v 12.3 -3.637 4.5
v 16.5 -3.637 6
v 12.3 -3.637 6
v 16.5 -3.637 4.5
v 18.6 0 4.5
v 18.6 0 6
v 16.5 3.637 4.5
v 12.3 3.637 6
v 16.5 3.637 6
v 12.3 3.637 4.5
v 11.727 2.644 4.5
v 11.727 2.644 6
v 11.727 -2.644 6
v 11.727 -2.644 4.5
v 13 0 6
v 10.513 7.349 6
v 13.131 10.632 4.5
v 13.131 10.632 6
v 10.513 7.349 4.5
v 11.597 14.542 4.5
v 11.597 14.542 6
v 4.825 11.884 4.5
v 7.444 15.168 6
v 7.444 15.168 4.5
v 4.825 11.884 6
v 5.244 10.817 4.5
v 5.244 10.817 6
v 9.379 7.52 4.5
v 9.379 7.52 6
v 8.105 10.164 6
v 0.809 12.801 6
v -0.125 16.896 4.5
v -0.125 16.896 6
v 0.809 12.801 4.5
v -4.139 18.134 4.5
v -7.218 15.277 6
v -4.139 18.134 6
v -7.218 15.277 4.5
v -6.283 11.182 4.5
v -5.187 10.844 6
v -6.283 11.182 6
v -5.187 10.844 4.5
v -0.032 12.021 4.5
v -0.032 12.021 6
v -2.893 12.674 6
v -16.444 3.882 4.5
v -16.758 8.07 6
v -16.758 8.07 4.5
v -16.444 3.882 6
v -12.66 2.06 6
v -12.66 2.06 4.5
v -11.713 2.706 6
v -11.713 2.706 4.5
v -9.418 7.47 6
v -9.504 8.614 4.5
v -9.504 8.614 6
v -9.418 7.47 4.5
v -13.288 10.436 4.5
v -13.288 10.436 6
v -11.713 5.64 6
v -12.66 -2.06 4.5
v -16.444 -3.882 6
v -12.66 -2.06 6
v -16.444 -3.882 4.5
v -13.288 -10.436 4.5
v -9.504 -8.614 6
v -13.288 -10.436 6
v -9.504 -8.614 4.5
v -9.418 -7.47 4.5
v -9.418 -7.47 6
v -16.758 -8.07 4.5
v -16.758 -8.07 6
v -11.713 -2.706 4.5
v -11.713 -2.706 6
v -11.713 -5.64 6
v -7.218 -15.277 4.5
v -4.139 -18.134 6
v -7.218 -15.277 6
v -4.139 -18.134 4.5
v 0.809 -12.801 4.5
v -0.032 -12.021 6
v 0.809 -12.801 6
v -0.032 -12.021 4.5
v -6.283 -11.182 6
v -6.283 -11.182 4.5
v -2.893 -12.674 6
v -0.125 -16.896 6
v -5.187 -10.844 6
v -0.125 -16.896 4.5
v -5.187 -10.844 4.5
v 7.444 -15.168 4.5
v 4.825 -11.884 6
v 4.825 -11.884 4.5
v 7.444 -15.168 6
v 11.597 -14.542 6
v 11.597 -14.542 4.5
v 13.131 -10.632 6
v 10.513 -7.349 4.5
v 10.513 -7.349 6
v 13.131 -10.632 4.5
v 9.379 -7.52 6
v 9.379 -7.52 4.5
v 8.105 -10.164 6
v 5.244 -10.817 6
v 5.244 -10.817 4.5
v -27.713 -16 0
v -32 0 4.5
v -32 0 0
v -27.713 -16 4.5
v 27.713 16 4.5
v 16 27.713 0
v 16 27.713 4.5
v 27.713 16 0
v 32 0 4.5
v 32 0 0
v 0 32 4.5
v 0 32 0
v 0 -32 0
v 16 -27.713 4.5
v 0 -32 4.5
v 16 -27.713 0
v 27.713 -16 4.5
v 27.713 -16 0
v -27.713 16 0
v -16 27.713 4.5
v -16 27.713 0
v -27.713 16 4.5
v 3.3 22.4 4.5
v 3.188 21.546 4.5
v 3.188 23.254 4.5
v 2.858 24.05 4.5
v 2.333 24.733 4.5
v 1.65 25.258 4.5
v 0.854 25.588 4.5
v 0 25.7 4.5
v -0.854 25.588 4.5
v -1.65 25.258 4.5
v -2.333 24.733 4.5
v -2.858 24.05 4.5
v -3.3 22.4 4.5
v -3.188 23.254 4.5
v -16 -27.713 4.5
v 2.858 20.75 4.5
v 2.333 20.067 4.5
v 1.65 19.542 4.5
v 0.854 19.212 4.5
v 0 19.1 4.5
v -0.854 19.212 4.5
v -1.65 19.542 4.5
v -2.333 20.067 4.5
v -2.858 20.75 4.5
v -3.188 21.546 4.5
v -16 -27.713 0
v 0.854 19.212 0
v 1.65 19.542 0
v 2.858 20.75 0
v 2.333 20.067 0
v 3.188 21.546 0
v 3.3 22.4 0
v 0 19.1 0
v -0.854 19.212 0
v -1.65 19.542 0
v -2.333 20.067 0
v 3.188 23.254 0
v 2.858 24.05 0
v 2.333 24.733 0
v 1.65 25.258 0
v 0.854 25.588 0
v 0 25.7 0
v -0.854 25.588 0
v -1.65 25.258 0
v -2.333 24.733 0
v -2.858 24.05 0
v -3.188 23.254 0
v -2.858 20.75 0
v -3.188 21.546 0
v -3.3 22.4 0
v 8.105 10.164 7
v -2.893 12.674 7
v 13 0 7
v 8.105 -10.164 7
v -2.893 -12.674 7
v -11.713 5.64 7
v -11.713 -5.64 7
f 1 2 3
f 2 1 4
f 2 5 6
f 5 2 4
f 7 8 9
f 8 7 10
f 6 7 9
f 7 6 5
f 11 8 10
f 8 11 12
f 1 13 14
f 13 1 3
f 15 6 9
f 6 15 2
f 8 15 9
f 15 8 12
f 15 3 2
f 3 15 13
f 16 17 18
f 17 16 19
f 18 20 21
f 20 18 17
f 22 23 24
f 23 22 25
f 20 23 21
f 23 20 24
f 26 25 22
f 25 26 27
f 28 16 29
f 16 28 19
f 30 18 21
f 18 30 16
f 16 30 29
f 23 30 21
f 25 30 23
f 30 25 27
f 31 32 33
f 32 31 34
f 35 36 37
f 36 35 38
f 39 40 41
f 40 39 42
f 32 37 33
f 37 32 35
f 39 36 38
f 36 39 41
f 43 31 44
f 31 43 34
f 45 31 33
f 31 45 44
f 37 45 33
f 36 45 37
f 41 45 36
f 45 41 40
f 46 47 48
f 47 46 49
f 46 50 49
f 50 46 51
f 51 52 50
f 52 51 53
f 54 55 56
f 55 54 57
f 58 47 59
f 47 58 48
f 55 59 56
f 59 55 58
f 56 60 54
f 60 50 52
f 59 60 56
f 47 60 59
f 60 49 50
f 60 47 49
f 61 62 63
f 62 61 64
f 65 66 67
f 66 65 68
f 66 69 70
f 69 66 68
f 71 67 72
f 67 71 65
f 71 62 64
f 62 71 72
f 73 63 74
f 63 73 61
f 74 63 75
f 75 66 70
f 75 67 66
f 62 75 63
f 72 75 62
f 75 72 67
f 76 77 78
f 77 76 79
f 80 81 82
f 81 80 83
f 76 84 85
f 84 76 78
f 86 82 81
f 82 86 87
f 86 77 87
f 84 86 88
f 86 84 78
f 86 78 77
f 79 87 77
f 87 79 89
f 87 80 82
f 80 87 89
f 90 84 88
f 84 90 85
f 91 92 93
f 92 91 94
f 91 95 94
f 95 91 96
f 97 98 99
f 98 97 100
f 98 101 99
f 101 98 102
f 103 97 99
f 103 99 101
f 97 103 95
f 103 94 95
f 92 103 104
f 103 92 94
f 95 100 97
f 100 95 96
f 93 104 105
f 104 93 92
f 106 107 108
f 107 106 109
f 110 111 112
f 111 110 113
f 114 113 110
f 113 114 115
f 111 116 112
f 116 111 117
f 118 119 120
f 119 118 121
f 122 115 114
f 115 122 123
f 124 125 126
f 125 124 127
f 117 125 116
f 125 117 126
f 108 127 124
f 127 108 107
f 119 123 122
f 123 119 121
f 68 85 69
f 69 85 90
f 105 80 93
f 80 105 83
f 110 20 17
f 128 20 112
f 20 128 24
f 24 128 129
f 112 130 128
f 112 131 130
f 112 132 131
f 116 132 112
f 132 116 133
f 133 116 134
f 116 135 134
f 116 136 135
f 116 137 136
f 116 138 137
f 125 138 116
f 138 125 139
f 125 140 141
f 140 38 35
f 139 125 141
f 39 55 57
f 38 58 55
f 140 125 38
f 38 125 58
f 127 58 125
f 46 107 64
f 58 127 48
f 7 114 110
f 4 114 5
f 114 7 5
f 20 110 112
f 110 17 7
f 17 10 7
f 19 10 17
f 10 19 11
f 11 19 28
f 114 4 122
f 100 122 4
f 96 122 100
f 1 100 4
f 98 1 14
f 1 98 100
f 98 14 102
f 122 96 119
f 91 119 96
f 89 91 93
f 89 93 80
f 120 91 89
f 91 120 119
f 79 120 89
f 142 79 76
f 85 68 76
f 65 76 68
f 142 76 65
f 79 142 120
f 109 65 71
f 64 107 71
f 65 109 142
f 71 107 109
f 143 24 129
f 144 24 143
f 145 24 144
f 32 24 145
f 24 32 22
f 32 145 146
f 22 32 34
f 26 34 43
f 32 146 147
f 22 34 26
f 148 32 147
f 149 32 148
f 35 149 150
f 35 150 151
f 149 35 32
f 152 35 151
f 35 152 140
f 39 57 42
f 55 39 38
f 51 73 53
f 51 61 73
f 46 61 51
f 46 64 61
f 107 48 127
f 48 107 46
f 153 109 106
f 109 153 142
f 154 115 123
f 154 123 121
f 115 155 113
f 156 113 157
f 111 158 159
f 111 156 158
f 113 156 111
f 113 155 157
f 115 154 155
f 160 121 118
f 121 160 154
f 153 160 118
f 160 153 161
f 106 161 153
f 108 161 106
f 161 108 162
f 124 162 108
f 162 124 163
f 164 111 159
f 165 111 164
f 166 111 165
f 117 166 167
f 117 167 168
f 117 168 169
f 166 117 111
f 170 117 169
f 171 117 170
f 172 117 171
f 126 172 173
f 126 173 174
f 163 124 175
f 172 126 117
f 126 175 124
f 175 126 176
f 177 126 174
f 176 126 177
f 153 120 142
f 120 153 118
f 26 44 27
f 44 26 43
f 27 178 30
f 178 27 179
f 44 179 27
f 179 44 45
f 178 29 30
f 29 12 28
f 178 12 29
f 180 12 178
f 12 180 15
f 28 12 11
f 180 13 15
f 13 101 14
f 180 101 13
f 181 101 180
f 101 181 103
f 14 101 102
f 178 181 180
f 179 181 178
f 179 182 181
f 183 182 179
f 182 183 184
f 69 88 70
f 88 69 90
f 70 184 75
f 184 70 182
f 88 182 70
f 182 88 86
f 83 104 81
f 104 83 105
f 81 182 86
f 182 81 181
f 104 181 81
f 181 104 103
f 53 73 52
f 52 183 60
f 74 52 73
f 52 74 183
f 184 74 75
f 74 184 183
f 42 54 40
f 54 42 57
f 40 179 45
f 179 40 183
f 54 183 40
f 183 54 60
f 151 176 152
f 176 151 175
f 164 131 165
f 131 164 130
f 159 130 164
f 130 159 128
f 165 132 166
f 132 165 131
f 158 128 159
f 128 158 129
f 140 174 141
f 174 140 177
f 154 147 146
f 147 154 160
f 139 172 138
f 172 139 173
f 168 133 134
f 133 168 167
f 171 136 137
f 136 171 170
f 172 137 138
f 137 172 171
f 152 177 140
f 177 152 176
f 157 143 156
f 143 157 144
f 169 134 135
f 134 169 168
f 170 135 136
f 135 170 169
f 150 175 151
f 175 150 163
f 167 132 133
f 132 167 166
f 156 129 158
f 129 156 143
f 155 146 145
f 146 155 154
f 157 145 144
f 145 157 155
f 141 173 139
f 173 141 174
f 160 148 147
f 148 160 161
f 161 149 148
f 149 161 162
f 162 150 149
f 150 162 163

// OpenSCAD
// file: lib/commerce_forms.scad
// Original parametric printable prototypes. Dimensions in millimeters.
// CAD is the manufacturing authority; Three.js gallery geometry is a stylized preview.
// No external copyrighted silhouettes, brands, logos or character geometry.
$fn=56;
module market_lantern(v=1) {
  r=27+v*2; h=76+v*6; wall=2.8;
  difference() {
    cylinder(r=r,h=h);
    translate([0,0,-1]) cylinder(r=r-wall,h=h+2);
    for (tier=[0:3], j=[0:7+v]) {
      a=360*j/(8+v)+tier*15;
      rotate([0,0,a])
        translate([r-1,0,17+tier*(h-33)/3])
          rotate([0,90,0]) cylinder(r=2.2+(v%3)*.5,h=10,center=true,$fn=18);
    }
  }
}
module market_figurine(v=1) {
  r=18+v;
  union() {
    cylinder(r=29,h=6);
    translate([0,0,7]) scale([1,0.85,1.15]) sphere(r=r);
    translate([0,0,35]) scale([1,.91,.84]) sphere(r=r*.78);
    for (s=[-1,1]) {
      translate([s*(r*.58),0,49])
        rotate([0,s*13,0]) cylinder(r1=5+v*.4,r2=1,h=10+v*2);
      translate([s*(r*.73),-2,20]) scale([.36,.55,.67]) sphere(r=r*.75);
    }
    translate([0,-r*.62,39]) sphere(r=3.5+v*.2);
    for(s=[-1,1])translate([s*7,-r*.72,43])sphere(r=1.8);
  }
}
module market_scenery(v=1) {
  union() {
    translate([-52,-32,0]) cube([104,64,4]);
    for (i=[0:2+v%2]) {
      x=-40+i*24;
      translate([x, -14+(i%2)*12,3.8])
        cube([15+v*2,19,13+v*3]);
      translate([x+2,-13+(i%2)*12,16+v*3])
        cube([11+v*2,15,3]);
    }
    for(i=[-1,1]) {
      translate([i*42,20,3.8]) cylinder(r=5,h=12+v*4);
      translate([i*42,20,15+v*4]) sphere(r=6);
    }
  }
}
module market_organizer(v=1) {
  w=104+v*5;d=69+v*3;h=32+v*3; columns=2+v%3;
  difference() {
    translate([-w/2,-d/2,0]) cube([w,d,h]);
    for(i=[0:columns-1])
      translate([-w/2+3+i*(w-6)/columns,-d/2+3,4])
        cube([(w-6)/columns-3,d-6,h+3]);
  }
}
module market_display(v=1) {
  union() {
    cylinder(r=34+v*2,h=6);
    translate([0,0,5.8]) cylinder(r1=12+v,r2=9,h=26+v*3);
    translate([0,0,30+v*3]) cylinder(r=25+v,h=5);
    for(s=[-1,1])
      translate([s*(16+v),0,34+v*3])
        cube([5,31,10],center=true);
  }
}
module market_gaming(v=1) {
  w=102+v*5;d=66+v*2; h=22+v*3;
  difference() {
    union() {
      translate([-w/2,-d/2,0]) cube([w,d,h]);
      translate([-w/2, d/2-14,h-1]) cube([w,12,15+v]);
    }
    translate([-w/2+5,-d/2+5,5]) cube([w-10,d-24,h+12]);
    for(i=[-1,0,1])
      translate([i*24,d/2-13,h+6]) rotate([90,0,0])
        cylinder(r=3.6+v*.3,h=16,$fn=22);
  }
}
module market_jewelry(v=1) {
  union() {
    translate([-40,-26,0]) cube([80,52,6]);
    for (i=[0:3+v%2]) {
      x=-29+i*58/(3+v%2);
      translate([x,0,5.8]) cylinder(r=3.2,h=42+v*5,$fn=24);
      translate([x,0,46+v*5]) sphere(r=5);
    }
    translate([-33,-5,42+v*5]) cube([66,9,6]);
    for(i=[0:4])translate([-25+i*12,0,46+v*5])
      cylinder(r1=4,r2=1.5,h=7,$fn=20);
  }
}
module market_planter(v=1) {
  r=34+v*2; h=48+v*6; w=3.2;
  difference() {
    union() {
      cylinder(r=r,h=h);
      for(i=[0:9+v])
        rotate([0,0,360*i/(10+v)])
          translate([r-.5,-1.6,2]) cube([2.2,3.2,h-4]);
    }
    translate([0,0,3.8]) cylinder(r=r-w,h=h+2);
    translate([0,0,-1]) cylinder(r=2.8,h=7,$fn=24);
  }
}
module market_gift(v=1,label="CUSTOM") {
  w=100+v*6;d=49+v*3;
  difference() {
    union() {
      hull()for(x=[-w/2+7,w/2-7],y=[-d/2+7,d/2-7])
        translate([x,y,0]) cylinder(r=7,h=6,$fn=24);
      translate([0,0,5.8]) linear_extrude(height=2.2)
        text(label,size=max(9,18-v),halign="center",valign="center",
             font="Liberation Sans:style=Bold");
    }
    if(v==3)for(x=[-w/2+10,w/2-10])
      translate([x,d/2-10,-1]) cylinder(r=2.5,h=10,$fn=24);
  }
}
module market_cosplay(v=1) {
  r=28+v*2;
  difference() {
    union() {
      cylinder(r=r,h=4.5,$fn=8+v*2);
      for(i=[0:4+v])
        rotate([0,0,360*i/(5+v)])
          translate([r*.45,0,4.2]) cylinder(r=4.2,h=1.8,$fn=6);
      cylinder(r=12+v*.5,h=7,$fn=5+v);
    }
    translate([0,r*.70,-1])cylinder(r=3.3,h=10,$fn=24);
  }
}
module commercial_form(family="lantern",variant=1,label="CUSTOM") {
  if(family=="lantern")market_lantern(variant);
  else if(family=="figurine")market_figurine(variant);
  else if(family=="scenery")market_scenery(variant);
  else if(family=="organizer")market_organizer(variant);
  else if(family=="display")market_display(variant);
  else if(family=="gaming")market_gaming(variant);
  else if(family=="jewelry")market_jewelry(variant);
  else if(family=="planter")market_planter(variant);
  else if(family=="gift")market_gift(variant,label);
  else if(family=="cosplay")market_cosplay(variant);
  else assert(false,str("Unknown family: ",family));
}
// main file
// Original 3D printable CAD prototype for Fantasy Crest Badge
// Millimeter units; edit parameters and print-test before commercial shipment.
use <lib/commerce_forms.scad>
commercial_form(family="cosplay",variant=2);
